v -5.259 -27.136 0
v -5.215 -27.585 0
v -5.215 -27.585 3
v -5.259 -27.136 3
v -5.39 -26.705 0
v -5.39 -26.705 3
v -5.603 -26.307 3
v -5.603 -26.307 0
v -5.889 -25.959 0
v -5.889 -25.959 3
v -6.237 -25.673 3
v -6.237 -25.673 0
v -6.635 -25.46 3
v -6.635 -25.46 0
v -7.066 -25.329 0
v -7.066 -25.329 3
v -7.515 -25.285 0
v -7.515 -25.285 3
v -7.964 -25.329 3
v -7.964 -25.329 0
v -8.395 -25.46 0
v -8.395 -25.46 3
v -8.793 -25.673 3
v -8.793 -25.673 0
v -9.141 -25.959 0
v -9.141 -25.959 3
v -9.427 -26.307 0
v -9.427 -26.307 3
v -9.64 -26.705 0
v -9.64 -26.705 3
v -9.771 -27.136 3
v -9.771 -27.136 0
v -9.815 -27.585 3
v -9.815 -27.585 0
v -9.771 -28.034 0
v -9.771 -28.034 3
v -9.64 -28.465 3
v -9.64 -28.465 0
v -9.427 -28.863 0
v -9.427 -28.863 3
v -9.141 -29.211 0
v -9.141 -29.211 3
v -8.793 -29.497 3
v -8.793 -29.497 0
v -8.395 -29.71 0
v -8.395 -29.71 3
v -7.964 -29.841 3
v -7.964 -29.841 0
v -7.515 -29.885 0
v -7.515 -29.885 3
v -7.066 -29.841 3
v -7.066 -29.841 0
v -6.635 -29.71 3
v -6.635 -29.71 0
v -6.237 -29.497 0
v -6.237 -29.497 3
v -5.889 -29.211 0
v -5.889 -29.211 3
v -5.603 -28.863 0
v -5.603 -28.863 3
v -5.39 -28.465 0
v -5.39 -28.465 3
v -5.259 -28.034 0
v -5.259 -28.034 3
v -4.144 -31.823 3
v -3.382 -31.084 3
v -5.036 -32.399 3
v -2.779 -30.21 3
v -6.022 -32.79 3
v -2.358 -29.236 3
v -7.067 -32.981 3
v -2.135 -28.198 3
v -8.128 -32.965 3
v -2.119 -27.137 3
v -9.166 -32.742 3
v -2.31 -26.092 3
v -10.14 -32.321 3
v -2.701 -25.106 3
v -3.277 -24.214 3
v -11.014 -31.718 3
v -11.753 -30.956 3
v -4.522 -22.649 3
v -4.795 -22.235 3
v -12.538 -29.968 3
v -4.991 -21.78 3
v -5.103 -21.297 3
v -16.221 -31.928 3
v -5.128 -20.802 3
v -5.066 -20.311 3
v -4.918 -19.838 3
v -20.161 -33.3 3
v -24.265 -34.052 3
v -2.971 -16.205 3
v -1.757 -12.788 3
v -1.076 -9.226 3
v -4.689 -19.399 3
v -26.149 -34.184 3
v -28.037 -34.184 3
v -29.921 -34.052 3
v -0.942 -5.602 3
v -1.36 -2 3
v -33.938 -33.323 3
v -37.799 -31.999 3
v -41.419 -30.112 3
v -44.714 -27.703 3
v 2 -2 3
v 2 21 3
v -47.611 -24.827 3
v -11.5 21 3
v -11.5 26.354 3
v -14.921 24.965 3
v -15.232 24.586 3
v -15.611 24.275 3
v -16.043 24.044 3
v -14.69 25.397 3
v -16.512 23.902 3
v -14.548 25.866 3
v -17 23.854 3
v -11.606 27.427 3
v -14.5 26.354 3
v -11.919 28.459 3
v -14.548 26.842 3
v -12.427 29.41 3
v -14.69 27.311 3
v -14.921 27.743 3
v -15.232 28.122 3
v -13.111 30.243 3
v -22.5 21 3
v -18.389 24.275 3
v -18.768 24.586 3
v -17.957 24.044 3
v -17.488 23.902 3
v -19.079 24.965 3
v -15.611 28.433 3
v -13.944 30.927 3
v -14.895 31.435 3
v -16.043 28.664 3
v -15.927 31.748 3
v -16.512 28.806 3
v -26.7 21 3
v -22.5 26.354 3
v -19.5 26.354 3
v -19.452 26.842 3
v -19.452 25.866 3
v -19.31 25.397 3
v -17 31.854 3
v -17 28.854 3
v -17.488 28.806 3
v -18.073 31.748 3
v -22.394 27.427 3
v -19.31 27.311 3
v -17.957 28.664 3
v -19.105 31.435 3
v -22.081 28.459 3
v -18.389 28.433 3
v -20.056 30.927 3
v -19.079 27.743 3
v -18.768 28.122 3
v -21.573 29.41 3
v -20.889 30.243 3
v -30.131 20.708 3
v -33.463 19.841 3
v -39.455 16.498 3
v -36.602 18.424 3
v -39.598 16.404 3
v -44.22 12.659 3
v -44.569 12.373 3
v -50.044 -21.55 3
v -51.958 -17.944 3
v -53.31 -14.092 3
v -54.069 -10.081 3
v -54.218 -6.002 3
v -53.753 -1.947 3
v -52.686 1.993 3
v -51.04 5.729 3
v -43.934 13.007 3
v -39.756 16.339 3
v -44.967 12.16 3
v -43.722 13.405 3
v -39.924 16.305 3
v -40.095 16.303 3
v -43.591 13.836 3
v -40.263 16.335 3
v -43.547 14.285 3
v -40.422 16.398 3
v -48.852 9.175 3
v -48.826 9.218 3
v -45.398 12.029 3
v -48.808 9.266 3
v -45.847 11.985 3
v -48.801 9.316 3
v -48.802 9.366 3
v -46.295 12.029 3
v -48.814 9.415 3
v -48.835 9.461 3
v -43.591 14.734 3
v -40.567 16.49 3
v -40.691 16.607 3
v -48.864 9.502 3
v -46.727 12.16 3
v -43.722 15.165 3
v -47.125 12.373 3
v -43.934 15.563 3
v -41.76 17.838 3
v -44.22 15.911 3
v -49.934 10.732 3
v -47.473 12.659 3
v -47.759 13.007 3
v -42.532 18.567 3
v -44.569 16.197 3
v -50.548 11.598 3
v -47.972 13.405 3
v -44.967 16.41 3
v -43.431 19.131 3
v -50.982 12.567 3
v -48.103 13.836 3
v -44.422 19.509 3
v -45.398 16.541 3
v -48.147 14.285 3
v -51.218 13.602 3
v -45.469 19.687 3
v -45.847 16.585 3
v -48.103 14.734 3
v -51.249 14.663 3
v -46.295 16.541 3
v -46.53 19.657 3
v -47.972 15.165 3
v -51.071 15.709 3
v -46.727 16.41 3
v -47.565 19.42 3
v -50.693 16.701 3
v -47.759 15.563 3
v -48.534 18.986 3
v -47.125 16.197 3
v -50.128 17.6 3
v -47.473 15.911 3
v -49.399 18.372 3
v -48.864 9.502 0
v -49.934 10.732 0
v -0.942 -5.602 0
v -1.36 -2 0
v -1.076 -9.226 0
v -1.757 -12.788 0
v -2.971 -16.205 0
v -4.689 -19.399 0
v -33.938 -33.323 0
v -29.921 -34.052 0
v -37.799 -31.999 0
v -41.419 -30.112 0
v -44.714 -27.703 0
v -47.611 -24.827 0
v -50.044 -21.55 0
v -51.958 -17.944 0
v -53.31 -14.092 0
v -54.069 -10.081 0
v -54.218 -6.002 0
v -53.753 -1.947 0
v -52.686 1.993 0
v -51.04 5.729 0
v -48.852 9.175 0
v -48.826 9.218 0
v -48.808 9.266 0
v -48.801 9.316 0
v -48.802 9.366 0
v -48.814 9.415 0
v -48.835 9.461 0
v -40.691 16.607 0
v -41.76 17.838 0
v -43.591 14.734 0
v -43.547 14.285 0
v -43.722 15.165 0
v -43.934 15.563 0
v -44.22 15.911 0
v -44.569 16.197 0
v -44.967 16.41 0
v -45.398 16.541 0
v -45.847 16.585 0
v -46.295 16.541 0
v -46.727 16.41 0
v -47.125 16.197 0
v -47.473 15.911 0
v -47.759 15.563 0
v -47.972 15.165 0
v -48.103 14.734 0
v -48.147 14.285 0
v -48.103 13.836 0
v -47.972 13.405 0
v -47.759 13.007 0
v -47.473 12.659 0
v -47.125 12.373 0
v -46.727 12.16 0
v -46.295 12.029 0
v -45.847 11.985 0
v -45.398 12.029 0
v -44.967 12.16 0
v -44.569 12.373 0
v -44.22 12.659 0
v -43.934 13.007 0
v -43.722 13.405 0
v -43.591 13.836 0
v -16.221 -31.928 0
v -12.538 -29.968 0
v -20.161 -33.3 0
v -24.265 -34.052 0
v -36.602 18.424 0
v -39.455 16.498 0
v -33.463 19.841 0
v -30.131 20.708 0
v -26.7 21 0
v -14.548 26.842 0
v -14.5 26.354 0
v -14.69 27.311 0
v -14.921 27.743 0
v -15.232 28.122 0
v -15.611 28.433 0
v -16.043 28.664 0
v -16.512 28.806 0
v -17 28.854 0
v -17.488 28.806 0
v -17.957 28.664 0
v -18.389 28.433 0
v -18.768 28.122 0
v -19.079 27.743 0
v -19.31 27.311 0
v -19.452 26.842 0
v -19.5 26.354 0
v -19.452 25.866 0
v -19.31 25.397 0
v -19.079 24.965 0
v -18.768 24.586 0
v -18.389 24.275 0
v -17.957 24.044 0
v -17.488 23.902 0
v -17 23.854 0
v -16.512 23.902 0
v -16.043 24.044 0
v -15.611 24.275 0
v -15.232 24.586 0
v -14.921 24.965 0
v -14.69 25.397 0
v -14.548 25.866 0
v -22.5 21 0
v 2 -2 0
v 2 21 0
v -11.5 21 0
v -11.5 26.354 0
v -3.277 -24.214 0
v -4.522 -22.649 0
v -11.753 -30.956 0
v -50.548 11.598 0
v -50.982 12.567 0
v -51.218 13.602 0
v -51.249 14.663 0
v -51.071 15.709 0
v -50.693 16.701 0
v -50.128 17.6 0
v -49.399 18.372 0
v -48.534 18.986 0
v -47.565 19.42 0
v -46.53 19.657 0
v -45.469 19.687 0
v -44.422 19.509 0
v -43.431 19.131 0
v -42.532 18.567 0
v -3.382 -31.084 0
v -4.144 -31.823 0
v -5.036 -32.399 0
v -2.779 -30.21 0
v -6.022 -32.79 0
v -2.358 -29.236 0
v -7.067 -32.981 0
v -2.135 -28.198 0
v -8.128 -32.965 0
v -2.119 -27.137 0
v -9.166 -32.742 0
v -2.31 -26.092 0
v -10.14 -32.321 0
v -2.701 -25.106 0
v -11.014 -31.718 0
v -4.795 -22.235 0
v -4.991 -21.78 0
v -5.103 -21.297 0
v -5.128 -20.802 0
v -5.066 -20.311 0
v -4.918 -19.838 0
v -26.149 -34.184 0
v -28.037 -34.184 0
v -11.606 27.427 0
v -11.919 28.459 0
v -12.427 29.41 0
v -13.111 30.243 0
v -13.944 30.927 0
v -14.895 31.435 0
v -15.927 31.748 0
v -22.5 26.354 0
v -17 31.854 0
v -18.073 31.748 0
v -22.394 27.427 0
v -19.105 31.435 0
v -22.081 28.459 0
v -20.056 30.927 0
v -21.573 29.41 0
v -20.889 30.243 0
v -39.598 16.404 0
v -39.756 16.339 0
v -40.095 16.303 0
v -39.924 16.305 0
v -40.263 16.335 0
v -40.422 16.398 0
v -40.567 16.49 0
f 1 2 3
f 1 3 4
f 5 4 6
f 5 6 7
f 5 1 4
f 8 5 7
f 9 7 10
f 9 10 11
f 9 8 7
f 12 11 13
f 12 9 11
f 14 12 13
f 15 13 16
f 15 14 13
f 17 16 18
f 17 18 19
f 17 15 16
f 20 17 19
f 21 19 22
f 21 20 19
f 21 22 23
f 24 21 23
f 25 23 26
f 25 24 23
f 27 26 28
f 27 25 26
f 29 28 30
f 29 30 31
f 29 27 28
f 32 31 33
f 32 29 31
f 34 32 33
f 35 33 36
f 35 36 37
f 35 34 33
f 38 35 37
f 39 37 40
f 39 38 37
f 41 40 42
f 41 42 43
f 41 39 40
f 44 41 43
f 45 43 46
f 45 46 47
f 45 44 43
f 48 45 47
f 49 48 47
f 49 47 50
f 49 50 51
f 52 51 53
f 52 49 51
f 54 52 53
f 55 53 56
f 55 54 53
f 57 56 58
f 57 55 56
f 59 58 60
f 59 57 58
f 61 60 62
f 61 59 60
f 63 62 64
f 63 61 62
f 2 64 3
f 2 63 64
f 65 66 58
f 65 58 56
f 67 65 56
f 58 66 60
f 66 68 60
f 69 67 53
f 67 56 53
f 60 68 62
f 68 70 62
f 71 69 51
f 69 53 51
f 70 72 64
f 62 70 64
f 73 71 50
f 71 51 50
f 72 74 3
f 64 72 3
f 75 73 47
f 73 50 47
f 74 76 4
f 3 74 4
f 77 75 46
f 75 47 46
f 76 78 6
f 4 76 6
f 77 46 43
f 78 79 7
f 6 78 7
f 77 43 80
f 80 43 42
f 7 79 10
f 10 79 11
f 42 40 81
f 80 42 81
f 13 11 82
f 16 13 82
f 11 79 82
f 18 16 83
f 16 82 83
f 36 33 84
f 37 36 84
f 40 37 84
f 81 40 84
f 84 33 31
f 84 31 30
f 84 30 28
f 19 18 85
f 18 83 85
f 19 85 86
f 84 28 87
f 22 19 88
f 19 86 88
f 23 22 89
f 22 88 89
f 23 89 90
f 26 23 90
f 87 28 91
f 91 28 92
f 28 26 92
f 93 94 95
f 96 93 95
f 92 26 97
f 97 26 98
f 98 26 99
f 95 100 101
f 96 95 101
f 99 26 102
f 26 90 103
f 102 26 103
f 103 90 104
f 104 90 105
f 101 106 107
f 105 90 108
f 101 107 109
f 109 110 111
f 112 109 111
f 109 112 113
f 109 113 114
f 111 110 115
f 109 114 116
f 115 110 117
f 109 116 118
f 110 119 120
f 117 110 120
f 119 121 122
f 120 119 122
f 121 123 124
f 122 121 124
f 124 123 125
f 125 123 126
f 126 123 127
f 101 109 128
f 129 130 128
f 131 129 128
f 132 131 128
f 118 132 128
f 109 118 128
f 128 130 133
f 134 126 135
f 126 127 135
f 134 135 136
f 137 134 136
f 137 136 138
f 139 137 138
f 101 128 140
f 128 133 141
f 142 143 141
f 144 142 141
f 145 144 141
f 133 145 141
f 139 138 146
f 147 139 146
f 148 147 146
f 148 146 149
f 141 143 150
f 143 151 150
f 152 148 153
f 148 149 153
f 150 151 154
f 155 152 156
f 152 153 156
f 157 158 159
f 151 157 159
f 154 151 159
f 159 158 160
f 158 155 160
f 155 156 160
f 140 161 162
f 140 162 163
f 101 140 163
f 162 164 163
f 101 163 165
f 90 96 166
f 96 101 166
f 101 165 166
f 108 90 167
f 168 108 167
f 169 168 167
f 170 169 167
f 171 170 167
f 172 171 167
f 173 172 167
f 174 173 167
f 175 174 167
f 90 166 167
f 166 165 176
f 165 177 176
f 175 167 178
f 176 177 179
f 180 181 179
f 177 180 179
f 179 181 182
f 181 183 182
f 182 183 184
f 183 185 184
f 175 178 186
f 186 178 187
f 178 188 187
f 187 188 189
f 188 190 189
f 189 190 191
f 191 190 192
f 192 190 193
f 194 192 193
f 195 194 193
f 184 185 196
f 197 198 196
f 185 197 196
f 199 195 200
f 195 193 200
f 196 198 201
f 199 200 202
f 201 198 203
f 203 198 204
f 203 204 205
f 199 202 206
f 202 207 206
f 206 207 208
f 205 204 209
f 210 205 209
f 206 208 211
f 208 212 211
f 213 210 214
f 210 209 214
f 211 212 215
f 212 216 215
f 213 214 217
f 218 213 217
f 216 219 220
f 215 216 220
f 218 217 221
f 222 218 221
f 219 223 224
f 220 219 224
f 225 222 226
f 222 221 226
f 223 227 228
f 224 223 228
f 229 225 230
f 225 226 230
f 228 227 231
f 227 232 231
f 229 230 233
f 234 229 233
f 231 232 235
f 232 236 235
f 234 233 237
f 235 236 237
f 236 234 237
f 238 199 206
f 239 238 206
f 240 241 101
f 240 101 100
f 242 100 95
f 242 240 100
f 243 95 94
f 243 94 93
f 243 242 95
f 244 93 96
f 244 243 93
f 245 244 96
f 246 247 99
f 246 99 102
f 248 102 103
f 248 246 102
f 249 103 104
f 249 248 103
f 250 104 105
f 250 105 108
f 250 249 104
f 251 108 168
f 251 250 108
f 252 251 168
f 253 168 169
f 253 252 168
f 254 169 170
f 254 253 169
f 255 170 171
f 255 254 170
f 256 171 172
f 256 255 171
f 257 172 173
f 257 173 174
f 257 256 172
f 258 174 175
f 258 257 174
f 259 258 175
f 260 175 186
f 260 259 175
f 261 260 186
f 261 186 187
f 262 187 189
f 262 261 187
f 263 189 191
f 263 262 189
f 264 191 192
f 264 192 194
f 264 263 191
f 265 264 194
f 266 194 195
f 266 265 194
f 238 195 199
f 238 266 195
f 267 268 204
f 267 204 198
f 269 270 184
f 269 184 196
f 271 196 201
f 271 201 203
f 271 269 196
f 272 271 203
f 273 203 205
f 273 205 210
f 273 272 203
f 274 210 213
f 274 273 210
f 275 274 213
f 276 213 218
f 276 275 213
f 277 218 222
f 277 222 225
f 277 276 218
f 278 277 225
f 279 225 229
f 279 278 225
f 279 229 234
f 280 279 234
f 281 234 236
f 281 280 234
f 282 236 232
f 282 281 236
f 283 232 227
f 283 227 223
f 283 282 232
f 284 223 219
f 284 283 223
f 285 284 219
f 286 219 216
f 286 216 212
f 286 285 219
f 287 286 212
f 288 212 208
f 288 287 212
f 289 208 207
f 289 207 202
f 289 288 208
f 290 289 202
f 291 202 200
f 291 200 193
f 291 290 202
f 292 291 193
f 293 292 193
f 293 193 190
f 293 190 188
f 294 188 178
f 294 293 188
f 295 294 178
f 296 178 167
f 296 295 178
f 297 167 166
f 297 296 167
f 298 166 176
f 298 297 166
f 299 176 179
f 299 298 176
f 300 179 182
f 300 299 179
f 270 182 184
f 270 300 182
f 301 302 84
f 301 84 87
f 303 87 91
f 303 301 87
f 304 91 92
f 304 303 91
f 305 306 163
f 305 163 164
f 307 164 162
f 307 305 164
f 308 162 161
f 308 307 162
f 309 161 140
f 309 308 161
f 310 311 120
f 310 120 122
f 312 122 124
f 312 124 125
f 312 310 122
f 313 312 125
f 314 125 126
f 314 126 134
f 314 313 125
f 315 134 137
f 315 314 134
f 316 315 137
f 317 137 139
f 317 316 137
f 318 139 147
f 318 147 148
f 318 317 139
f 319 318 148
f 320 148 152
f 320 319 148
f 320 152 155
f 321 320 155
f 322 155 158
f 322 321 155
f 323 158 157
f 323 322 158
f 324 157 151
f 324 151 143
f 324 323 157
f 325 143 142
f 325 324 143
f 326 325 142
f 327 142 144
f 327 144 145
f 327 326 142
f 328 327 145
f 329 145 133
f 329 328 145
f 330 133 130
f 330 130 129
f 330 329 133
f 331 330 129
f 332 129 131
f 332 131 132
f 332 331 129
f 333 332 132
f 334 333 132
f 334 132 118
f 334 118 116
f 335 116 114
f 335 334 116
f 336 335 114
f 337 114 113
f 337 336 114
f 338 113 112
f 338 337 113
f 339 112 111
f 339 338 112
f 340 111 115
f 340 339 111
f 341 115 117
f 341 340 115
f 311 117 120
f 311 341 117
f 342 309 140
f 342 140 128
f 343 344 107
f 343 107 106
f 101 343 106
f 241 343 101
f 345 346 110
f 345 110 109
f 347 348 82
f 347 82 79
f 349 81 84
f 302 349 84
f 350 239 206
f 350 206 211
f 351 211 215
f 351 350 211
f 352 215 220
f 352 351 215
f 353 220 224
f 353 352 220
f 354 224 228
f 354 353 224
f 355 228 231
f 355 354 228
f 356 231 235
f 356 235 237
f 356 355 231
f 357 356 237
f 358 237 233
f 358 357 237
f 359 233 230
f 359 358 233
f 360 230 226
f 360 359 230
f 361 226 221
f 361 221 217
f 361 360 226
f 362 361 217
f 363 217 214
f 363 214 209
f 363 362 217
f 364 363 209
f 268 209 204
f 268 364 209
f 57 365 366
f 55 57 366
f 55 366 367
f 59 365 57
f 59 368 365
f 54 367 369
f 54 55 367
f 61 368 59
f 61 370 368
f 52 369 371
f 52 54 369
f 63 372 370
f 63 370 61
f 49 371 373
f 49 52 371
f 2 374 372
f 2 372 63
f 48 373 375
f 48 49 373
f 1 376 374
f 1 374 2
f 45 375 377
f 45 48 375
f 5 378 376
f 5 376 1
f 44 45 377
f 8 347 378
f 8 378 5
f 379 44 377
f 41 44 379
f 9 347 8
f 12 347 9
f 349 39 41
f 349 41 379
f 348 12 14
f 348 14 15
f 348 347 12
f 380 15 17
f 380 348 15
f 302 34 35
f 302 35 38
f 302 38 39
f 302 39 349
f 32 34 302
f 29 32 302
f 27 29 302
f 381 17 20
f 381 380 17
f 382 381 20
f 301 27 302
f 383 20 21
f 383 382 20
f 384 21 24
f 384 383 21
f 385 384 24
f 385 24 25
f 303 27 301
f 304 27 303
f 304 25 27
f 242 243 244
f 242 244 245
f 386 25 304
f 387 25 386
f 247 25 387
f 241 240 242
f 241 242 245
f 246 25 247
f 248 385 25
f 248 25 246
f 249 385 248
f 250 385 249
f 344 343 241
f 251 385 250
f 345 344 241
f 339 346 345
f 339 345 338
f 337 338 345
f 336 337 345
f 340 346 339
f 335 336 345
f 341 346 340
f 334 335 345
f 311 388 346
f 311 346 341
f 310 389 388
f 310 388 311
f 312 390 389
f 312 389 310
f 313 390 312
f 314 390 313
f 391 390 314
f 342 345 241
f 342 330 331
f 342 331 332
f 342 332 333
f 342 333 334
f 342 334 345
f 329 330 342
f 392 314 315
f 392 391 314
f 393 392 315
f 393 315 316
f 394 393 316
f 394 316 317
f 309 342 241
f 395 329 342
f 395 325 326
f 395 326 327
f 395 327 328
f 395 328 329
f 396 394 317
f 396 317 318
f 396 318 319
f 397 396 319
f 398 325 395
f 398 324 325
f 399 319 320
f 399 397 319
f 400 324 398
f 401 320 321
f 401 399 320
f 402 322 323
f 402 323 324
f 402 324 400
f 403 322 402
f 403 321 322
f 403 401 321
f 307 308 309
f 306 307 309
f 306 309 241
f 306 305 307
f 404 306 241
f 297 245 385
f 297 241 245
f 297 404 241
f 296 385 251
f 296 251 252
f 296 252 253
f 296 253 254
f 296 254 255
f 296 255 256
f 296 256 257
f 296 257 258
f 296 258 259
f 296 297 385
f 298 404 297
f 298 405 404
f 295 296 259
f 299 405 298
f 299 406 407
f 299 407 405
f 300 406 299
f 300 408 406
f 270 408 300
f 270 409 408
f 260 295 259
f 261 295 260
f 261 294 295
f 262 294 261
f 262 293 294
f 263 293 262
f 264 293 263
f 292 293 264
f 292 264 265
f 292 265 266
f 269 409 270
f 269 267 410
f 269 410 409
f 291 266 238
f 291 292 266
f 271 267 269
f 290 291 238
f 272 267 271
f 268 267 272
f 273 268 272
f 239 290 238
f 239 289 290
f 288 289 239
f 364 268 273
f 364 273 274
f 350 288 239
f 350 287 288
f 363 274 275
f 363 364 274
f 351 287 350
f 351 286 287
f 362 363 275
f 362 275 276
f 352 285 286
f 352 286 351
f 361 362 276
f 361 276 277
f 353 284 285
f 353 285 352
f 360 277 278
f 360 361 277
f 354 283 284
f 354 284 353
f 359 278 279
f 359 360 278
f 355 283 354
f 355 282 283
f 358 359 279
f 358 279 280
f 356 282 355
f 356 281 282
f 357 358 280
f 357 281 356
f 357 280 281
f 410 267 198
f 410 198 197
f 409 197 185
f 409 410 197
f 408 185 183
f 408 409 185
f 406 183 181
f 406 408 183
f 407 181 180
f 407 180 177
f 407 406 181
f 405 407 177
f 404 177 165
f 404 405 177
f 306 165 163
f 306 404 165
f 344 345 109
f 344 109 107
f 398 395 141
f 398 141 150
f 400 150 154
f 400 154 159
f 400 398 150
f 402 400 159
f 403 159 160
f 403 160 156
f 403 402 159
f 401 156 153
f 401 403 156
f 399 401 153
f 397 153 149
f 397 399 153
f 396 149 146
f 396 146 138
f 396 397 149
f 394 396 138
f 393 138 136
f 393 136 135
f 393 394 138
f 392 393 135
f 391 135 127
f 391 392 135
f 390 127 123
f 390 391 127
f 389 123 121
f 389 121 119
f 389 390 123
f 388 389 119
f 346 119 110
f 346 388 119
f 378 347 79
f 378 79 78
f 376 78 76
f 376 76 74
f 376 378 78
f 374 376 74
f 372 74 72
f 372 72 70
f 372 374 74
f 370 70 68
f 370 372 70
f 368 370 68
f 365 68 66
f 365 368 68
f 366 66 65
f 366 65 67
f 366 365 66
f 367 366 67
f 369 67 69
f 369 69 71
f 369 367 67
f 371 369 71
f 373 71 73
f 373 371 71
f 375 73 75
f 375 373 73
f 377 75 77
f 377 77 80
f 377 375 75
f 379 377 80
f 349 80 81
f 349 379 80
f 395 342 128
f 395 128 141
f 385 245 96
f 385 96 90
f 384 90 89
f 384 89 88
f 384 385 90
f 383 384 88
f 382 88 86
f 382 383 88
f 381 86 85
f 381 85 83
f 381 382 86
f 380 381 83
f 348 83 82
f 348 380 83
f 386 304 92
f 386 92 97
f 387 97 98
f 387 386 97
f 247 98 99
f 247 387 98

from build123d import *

# Parameters (mm, degrees)
SKETCH1_R           = 2.3
SKETCH1_R_2         = 2.5
BOSS_EXTRUDE1_DEPTH = 3


with BuildPart() as part:
    # Sketch1 → Boss-Extrude1 (new body)
    with BuildSketch(Plane.XY):
        with BuildLine():
            Line((-11.5, 21), (2, 21))
            Line((2, 21), (2, -2))
            Line((2, -2), (-1.360059051, -2))
            ThreePointArc((-1.360059051, -2), (-1.348623714, -11.019912453), (-4.688647717, -19.398646909))
            ThreePointArc((-4.688647717, -19.398646909), (-5.126699638, -21.05045095), (-4.522206104, -22.648866929))
            Line((-4.522206104, -22.648866929), (-3.277176831, -24.214083243))
            ThreePointArc((-3.277176831, -24.214083243), (-4.144083243, -31.822823169), (-11.752823169, -30.955916757))
            Line((-11.752823169, -30.955916757), (-12.538462624, -29.968232598))
            ThreePointArc((-12.538462624, -29.968232598), (-18.164899658, -32.689735637), (-24.264648783, -34.05224549))
            ThreePointArc((-24.264648783, -34.05224549), (-27.093039229, -34.2), (-29.921429675, -34.05224549))
            ThreePointArc((-29.921429675, -34.05224549), (-51.958319855, -17.944091524), (-48.851858813, 9.175035542))
            ThreePointArc((-48.851858813, 9.175035542), (-48.800272502, 9.340767339), (-48.864085593, 9.502186251))
            Line((-48.864085593, 9.502186251), (-49.933529172, 10.732440358))
            ThreePointArc((-49.933529172, 10.732440358), (-49.399336437, 18.371752377), (-41.760024419, 17.837559642))
            Line((-41.760024419, 17.837559642), (-40.69058084, 16.607305535))
            ThreePointArc((-40.69058084, 16.607305535), (-40.095055579, 16.303481207), (-39.455414432, 16.49795167))
            ThreePointArc((-39.455414432, 16.49795167), (-33.463302383, 19.841462143), (-26.7, 21))
            Line((-26.7, 21), (-22.5, 21))
            Line((-22.5, 21), (-22.5, 26.353946086))
            ThreePointArc((-22.5, 26.353946086), (-17, 31.853946086), (-11.5, 26.353946086))
            Line((-11.5, 26.353946086), (-11.5, 21))
        make_face()
        with Locations((-45.846776795, 14.285)):
            Circle(SKETCH1_R, mode=Mode.SUBTRACT)
        with Locations((-7.515, -27.585)):
            Circle(SKETCH1_R, mode=Mode.SUBTRACT)
        with Locations((-17, 26.353946086)):
            Circle(SKETCH1_R_2, mode=Mode.SUBTRACT)
    extrude(amount=BOSS_EXTRUDE1_DEPTH)


solid = part.part
